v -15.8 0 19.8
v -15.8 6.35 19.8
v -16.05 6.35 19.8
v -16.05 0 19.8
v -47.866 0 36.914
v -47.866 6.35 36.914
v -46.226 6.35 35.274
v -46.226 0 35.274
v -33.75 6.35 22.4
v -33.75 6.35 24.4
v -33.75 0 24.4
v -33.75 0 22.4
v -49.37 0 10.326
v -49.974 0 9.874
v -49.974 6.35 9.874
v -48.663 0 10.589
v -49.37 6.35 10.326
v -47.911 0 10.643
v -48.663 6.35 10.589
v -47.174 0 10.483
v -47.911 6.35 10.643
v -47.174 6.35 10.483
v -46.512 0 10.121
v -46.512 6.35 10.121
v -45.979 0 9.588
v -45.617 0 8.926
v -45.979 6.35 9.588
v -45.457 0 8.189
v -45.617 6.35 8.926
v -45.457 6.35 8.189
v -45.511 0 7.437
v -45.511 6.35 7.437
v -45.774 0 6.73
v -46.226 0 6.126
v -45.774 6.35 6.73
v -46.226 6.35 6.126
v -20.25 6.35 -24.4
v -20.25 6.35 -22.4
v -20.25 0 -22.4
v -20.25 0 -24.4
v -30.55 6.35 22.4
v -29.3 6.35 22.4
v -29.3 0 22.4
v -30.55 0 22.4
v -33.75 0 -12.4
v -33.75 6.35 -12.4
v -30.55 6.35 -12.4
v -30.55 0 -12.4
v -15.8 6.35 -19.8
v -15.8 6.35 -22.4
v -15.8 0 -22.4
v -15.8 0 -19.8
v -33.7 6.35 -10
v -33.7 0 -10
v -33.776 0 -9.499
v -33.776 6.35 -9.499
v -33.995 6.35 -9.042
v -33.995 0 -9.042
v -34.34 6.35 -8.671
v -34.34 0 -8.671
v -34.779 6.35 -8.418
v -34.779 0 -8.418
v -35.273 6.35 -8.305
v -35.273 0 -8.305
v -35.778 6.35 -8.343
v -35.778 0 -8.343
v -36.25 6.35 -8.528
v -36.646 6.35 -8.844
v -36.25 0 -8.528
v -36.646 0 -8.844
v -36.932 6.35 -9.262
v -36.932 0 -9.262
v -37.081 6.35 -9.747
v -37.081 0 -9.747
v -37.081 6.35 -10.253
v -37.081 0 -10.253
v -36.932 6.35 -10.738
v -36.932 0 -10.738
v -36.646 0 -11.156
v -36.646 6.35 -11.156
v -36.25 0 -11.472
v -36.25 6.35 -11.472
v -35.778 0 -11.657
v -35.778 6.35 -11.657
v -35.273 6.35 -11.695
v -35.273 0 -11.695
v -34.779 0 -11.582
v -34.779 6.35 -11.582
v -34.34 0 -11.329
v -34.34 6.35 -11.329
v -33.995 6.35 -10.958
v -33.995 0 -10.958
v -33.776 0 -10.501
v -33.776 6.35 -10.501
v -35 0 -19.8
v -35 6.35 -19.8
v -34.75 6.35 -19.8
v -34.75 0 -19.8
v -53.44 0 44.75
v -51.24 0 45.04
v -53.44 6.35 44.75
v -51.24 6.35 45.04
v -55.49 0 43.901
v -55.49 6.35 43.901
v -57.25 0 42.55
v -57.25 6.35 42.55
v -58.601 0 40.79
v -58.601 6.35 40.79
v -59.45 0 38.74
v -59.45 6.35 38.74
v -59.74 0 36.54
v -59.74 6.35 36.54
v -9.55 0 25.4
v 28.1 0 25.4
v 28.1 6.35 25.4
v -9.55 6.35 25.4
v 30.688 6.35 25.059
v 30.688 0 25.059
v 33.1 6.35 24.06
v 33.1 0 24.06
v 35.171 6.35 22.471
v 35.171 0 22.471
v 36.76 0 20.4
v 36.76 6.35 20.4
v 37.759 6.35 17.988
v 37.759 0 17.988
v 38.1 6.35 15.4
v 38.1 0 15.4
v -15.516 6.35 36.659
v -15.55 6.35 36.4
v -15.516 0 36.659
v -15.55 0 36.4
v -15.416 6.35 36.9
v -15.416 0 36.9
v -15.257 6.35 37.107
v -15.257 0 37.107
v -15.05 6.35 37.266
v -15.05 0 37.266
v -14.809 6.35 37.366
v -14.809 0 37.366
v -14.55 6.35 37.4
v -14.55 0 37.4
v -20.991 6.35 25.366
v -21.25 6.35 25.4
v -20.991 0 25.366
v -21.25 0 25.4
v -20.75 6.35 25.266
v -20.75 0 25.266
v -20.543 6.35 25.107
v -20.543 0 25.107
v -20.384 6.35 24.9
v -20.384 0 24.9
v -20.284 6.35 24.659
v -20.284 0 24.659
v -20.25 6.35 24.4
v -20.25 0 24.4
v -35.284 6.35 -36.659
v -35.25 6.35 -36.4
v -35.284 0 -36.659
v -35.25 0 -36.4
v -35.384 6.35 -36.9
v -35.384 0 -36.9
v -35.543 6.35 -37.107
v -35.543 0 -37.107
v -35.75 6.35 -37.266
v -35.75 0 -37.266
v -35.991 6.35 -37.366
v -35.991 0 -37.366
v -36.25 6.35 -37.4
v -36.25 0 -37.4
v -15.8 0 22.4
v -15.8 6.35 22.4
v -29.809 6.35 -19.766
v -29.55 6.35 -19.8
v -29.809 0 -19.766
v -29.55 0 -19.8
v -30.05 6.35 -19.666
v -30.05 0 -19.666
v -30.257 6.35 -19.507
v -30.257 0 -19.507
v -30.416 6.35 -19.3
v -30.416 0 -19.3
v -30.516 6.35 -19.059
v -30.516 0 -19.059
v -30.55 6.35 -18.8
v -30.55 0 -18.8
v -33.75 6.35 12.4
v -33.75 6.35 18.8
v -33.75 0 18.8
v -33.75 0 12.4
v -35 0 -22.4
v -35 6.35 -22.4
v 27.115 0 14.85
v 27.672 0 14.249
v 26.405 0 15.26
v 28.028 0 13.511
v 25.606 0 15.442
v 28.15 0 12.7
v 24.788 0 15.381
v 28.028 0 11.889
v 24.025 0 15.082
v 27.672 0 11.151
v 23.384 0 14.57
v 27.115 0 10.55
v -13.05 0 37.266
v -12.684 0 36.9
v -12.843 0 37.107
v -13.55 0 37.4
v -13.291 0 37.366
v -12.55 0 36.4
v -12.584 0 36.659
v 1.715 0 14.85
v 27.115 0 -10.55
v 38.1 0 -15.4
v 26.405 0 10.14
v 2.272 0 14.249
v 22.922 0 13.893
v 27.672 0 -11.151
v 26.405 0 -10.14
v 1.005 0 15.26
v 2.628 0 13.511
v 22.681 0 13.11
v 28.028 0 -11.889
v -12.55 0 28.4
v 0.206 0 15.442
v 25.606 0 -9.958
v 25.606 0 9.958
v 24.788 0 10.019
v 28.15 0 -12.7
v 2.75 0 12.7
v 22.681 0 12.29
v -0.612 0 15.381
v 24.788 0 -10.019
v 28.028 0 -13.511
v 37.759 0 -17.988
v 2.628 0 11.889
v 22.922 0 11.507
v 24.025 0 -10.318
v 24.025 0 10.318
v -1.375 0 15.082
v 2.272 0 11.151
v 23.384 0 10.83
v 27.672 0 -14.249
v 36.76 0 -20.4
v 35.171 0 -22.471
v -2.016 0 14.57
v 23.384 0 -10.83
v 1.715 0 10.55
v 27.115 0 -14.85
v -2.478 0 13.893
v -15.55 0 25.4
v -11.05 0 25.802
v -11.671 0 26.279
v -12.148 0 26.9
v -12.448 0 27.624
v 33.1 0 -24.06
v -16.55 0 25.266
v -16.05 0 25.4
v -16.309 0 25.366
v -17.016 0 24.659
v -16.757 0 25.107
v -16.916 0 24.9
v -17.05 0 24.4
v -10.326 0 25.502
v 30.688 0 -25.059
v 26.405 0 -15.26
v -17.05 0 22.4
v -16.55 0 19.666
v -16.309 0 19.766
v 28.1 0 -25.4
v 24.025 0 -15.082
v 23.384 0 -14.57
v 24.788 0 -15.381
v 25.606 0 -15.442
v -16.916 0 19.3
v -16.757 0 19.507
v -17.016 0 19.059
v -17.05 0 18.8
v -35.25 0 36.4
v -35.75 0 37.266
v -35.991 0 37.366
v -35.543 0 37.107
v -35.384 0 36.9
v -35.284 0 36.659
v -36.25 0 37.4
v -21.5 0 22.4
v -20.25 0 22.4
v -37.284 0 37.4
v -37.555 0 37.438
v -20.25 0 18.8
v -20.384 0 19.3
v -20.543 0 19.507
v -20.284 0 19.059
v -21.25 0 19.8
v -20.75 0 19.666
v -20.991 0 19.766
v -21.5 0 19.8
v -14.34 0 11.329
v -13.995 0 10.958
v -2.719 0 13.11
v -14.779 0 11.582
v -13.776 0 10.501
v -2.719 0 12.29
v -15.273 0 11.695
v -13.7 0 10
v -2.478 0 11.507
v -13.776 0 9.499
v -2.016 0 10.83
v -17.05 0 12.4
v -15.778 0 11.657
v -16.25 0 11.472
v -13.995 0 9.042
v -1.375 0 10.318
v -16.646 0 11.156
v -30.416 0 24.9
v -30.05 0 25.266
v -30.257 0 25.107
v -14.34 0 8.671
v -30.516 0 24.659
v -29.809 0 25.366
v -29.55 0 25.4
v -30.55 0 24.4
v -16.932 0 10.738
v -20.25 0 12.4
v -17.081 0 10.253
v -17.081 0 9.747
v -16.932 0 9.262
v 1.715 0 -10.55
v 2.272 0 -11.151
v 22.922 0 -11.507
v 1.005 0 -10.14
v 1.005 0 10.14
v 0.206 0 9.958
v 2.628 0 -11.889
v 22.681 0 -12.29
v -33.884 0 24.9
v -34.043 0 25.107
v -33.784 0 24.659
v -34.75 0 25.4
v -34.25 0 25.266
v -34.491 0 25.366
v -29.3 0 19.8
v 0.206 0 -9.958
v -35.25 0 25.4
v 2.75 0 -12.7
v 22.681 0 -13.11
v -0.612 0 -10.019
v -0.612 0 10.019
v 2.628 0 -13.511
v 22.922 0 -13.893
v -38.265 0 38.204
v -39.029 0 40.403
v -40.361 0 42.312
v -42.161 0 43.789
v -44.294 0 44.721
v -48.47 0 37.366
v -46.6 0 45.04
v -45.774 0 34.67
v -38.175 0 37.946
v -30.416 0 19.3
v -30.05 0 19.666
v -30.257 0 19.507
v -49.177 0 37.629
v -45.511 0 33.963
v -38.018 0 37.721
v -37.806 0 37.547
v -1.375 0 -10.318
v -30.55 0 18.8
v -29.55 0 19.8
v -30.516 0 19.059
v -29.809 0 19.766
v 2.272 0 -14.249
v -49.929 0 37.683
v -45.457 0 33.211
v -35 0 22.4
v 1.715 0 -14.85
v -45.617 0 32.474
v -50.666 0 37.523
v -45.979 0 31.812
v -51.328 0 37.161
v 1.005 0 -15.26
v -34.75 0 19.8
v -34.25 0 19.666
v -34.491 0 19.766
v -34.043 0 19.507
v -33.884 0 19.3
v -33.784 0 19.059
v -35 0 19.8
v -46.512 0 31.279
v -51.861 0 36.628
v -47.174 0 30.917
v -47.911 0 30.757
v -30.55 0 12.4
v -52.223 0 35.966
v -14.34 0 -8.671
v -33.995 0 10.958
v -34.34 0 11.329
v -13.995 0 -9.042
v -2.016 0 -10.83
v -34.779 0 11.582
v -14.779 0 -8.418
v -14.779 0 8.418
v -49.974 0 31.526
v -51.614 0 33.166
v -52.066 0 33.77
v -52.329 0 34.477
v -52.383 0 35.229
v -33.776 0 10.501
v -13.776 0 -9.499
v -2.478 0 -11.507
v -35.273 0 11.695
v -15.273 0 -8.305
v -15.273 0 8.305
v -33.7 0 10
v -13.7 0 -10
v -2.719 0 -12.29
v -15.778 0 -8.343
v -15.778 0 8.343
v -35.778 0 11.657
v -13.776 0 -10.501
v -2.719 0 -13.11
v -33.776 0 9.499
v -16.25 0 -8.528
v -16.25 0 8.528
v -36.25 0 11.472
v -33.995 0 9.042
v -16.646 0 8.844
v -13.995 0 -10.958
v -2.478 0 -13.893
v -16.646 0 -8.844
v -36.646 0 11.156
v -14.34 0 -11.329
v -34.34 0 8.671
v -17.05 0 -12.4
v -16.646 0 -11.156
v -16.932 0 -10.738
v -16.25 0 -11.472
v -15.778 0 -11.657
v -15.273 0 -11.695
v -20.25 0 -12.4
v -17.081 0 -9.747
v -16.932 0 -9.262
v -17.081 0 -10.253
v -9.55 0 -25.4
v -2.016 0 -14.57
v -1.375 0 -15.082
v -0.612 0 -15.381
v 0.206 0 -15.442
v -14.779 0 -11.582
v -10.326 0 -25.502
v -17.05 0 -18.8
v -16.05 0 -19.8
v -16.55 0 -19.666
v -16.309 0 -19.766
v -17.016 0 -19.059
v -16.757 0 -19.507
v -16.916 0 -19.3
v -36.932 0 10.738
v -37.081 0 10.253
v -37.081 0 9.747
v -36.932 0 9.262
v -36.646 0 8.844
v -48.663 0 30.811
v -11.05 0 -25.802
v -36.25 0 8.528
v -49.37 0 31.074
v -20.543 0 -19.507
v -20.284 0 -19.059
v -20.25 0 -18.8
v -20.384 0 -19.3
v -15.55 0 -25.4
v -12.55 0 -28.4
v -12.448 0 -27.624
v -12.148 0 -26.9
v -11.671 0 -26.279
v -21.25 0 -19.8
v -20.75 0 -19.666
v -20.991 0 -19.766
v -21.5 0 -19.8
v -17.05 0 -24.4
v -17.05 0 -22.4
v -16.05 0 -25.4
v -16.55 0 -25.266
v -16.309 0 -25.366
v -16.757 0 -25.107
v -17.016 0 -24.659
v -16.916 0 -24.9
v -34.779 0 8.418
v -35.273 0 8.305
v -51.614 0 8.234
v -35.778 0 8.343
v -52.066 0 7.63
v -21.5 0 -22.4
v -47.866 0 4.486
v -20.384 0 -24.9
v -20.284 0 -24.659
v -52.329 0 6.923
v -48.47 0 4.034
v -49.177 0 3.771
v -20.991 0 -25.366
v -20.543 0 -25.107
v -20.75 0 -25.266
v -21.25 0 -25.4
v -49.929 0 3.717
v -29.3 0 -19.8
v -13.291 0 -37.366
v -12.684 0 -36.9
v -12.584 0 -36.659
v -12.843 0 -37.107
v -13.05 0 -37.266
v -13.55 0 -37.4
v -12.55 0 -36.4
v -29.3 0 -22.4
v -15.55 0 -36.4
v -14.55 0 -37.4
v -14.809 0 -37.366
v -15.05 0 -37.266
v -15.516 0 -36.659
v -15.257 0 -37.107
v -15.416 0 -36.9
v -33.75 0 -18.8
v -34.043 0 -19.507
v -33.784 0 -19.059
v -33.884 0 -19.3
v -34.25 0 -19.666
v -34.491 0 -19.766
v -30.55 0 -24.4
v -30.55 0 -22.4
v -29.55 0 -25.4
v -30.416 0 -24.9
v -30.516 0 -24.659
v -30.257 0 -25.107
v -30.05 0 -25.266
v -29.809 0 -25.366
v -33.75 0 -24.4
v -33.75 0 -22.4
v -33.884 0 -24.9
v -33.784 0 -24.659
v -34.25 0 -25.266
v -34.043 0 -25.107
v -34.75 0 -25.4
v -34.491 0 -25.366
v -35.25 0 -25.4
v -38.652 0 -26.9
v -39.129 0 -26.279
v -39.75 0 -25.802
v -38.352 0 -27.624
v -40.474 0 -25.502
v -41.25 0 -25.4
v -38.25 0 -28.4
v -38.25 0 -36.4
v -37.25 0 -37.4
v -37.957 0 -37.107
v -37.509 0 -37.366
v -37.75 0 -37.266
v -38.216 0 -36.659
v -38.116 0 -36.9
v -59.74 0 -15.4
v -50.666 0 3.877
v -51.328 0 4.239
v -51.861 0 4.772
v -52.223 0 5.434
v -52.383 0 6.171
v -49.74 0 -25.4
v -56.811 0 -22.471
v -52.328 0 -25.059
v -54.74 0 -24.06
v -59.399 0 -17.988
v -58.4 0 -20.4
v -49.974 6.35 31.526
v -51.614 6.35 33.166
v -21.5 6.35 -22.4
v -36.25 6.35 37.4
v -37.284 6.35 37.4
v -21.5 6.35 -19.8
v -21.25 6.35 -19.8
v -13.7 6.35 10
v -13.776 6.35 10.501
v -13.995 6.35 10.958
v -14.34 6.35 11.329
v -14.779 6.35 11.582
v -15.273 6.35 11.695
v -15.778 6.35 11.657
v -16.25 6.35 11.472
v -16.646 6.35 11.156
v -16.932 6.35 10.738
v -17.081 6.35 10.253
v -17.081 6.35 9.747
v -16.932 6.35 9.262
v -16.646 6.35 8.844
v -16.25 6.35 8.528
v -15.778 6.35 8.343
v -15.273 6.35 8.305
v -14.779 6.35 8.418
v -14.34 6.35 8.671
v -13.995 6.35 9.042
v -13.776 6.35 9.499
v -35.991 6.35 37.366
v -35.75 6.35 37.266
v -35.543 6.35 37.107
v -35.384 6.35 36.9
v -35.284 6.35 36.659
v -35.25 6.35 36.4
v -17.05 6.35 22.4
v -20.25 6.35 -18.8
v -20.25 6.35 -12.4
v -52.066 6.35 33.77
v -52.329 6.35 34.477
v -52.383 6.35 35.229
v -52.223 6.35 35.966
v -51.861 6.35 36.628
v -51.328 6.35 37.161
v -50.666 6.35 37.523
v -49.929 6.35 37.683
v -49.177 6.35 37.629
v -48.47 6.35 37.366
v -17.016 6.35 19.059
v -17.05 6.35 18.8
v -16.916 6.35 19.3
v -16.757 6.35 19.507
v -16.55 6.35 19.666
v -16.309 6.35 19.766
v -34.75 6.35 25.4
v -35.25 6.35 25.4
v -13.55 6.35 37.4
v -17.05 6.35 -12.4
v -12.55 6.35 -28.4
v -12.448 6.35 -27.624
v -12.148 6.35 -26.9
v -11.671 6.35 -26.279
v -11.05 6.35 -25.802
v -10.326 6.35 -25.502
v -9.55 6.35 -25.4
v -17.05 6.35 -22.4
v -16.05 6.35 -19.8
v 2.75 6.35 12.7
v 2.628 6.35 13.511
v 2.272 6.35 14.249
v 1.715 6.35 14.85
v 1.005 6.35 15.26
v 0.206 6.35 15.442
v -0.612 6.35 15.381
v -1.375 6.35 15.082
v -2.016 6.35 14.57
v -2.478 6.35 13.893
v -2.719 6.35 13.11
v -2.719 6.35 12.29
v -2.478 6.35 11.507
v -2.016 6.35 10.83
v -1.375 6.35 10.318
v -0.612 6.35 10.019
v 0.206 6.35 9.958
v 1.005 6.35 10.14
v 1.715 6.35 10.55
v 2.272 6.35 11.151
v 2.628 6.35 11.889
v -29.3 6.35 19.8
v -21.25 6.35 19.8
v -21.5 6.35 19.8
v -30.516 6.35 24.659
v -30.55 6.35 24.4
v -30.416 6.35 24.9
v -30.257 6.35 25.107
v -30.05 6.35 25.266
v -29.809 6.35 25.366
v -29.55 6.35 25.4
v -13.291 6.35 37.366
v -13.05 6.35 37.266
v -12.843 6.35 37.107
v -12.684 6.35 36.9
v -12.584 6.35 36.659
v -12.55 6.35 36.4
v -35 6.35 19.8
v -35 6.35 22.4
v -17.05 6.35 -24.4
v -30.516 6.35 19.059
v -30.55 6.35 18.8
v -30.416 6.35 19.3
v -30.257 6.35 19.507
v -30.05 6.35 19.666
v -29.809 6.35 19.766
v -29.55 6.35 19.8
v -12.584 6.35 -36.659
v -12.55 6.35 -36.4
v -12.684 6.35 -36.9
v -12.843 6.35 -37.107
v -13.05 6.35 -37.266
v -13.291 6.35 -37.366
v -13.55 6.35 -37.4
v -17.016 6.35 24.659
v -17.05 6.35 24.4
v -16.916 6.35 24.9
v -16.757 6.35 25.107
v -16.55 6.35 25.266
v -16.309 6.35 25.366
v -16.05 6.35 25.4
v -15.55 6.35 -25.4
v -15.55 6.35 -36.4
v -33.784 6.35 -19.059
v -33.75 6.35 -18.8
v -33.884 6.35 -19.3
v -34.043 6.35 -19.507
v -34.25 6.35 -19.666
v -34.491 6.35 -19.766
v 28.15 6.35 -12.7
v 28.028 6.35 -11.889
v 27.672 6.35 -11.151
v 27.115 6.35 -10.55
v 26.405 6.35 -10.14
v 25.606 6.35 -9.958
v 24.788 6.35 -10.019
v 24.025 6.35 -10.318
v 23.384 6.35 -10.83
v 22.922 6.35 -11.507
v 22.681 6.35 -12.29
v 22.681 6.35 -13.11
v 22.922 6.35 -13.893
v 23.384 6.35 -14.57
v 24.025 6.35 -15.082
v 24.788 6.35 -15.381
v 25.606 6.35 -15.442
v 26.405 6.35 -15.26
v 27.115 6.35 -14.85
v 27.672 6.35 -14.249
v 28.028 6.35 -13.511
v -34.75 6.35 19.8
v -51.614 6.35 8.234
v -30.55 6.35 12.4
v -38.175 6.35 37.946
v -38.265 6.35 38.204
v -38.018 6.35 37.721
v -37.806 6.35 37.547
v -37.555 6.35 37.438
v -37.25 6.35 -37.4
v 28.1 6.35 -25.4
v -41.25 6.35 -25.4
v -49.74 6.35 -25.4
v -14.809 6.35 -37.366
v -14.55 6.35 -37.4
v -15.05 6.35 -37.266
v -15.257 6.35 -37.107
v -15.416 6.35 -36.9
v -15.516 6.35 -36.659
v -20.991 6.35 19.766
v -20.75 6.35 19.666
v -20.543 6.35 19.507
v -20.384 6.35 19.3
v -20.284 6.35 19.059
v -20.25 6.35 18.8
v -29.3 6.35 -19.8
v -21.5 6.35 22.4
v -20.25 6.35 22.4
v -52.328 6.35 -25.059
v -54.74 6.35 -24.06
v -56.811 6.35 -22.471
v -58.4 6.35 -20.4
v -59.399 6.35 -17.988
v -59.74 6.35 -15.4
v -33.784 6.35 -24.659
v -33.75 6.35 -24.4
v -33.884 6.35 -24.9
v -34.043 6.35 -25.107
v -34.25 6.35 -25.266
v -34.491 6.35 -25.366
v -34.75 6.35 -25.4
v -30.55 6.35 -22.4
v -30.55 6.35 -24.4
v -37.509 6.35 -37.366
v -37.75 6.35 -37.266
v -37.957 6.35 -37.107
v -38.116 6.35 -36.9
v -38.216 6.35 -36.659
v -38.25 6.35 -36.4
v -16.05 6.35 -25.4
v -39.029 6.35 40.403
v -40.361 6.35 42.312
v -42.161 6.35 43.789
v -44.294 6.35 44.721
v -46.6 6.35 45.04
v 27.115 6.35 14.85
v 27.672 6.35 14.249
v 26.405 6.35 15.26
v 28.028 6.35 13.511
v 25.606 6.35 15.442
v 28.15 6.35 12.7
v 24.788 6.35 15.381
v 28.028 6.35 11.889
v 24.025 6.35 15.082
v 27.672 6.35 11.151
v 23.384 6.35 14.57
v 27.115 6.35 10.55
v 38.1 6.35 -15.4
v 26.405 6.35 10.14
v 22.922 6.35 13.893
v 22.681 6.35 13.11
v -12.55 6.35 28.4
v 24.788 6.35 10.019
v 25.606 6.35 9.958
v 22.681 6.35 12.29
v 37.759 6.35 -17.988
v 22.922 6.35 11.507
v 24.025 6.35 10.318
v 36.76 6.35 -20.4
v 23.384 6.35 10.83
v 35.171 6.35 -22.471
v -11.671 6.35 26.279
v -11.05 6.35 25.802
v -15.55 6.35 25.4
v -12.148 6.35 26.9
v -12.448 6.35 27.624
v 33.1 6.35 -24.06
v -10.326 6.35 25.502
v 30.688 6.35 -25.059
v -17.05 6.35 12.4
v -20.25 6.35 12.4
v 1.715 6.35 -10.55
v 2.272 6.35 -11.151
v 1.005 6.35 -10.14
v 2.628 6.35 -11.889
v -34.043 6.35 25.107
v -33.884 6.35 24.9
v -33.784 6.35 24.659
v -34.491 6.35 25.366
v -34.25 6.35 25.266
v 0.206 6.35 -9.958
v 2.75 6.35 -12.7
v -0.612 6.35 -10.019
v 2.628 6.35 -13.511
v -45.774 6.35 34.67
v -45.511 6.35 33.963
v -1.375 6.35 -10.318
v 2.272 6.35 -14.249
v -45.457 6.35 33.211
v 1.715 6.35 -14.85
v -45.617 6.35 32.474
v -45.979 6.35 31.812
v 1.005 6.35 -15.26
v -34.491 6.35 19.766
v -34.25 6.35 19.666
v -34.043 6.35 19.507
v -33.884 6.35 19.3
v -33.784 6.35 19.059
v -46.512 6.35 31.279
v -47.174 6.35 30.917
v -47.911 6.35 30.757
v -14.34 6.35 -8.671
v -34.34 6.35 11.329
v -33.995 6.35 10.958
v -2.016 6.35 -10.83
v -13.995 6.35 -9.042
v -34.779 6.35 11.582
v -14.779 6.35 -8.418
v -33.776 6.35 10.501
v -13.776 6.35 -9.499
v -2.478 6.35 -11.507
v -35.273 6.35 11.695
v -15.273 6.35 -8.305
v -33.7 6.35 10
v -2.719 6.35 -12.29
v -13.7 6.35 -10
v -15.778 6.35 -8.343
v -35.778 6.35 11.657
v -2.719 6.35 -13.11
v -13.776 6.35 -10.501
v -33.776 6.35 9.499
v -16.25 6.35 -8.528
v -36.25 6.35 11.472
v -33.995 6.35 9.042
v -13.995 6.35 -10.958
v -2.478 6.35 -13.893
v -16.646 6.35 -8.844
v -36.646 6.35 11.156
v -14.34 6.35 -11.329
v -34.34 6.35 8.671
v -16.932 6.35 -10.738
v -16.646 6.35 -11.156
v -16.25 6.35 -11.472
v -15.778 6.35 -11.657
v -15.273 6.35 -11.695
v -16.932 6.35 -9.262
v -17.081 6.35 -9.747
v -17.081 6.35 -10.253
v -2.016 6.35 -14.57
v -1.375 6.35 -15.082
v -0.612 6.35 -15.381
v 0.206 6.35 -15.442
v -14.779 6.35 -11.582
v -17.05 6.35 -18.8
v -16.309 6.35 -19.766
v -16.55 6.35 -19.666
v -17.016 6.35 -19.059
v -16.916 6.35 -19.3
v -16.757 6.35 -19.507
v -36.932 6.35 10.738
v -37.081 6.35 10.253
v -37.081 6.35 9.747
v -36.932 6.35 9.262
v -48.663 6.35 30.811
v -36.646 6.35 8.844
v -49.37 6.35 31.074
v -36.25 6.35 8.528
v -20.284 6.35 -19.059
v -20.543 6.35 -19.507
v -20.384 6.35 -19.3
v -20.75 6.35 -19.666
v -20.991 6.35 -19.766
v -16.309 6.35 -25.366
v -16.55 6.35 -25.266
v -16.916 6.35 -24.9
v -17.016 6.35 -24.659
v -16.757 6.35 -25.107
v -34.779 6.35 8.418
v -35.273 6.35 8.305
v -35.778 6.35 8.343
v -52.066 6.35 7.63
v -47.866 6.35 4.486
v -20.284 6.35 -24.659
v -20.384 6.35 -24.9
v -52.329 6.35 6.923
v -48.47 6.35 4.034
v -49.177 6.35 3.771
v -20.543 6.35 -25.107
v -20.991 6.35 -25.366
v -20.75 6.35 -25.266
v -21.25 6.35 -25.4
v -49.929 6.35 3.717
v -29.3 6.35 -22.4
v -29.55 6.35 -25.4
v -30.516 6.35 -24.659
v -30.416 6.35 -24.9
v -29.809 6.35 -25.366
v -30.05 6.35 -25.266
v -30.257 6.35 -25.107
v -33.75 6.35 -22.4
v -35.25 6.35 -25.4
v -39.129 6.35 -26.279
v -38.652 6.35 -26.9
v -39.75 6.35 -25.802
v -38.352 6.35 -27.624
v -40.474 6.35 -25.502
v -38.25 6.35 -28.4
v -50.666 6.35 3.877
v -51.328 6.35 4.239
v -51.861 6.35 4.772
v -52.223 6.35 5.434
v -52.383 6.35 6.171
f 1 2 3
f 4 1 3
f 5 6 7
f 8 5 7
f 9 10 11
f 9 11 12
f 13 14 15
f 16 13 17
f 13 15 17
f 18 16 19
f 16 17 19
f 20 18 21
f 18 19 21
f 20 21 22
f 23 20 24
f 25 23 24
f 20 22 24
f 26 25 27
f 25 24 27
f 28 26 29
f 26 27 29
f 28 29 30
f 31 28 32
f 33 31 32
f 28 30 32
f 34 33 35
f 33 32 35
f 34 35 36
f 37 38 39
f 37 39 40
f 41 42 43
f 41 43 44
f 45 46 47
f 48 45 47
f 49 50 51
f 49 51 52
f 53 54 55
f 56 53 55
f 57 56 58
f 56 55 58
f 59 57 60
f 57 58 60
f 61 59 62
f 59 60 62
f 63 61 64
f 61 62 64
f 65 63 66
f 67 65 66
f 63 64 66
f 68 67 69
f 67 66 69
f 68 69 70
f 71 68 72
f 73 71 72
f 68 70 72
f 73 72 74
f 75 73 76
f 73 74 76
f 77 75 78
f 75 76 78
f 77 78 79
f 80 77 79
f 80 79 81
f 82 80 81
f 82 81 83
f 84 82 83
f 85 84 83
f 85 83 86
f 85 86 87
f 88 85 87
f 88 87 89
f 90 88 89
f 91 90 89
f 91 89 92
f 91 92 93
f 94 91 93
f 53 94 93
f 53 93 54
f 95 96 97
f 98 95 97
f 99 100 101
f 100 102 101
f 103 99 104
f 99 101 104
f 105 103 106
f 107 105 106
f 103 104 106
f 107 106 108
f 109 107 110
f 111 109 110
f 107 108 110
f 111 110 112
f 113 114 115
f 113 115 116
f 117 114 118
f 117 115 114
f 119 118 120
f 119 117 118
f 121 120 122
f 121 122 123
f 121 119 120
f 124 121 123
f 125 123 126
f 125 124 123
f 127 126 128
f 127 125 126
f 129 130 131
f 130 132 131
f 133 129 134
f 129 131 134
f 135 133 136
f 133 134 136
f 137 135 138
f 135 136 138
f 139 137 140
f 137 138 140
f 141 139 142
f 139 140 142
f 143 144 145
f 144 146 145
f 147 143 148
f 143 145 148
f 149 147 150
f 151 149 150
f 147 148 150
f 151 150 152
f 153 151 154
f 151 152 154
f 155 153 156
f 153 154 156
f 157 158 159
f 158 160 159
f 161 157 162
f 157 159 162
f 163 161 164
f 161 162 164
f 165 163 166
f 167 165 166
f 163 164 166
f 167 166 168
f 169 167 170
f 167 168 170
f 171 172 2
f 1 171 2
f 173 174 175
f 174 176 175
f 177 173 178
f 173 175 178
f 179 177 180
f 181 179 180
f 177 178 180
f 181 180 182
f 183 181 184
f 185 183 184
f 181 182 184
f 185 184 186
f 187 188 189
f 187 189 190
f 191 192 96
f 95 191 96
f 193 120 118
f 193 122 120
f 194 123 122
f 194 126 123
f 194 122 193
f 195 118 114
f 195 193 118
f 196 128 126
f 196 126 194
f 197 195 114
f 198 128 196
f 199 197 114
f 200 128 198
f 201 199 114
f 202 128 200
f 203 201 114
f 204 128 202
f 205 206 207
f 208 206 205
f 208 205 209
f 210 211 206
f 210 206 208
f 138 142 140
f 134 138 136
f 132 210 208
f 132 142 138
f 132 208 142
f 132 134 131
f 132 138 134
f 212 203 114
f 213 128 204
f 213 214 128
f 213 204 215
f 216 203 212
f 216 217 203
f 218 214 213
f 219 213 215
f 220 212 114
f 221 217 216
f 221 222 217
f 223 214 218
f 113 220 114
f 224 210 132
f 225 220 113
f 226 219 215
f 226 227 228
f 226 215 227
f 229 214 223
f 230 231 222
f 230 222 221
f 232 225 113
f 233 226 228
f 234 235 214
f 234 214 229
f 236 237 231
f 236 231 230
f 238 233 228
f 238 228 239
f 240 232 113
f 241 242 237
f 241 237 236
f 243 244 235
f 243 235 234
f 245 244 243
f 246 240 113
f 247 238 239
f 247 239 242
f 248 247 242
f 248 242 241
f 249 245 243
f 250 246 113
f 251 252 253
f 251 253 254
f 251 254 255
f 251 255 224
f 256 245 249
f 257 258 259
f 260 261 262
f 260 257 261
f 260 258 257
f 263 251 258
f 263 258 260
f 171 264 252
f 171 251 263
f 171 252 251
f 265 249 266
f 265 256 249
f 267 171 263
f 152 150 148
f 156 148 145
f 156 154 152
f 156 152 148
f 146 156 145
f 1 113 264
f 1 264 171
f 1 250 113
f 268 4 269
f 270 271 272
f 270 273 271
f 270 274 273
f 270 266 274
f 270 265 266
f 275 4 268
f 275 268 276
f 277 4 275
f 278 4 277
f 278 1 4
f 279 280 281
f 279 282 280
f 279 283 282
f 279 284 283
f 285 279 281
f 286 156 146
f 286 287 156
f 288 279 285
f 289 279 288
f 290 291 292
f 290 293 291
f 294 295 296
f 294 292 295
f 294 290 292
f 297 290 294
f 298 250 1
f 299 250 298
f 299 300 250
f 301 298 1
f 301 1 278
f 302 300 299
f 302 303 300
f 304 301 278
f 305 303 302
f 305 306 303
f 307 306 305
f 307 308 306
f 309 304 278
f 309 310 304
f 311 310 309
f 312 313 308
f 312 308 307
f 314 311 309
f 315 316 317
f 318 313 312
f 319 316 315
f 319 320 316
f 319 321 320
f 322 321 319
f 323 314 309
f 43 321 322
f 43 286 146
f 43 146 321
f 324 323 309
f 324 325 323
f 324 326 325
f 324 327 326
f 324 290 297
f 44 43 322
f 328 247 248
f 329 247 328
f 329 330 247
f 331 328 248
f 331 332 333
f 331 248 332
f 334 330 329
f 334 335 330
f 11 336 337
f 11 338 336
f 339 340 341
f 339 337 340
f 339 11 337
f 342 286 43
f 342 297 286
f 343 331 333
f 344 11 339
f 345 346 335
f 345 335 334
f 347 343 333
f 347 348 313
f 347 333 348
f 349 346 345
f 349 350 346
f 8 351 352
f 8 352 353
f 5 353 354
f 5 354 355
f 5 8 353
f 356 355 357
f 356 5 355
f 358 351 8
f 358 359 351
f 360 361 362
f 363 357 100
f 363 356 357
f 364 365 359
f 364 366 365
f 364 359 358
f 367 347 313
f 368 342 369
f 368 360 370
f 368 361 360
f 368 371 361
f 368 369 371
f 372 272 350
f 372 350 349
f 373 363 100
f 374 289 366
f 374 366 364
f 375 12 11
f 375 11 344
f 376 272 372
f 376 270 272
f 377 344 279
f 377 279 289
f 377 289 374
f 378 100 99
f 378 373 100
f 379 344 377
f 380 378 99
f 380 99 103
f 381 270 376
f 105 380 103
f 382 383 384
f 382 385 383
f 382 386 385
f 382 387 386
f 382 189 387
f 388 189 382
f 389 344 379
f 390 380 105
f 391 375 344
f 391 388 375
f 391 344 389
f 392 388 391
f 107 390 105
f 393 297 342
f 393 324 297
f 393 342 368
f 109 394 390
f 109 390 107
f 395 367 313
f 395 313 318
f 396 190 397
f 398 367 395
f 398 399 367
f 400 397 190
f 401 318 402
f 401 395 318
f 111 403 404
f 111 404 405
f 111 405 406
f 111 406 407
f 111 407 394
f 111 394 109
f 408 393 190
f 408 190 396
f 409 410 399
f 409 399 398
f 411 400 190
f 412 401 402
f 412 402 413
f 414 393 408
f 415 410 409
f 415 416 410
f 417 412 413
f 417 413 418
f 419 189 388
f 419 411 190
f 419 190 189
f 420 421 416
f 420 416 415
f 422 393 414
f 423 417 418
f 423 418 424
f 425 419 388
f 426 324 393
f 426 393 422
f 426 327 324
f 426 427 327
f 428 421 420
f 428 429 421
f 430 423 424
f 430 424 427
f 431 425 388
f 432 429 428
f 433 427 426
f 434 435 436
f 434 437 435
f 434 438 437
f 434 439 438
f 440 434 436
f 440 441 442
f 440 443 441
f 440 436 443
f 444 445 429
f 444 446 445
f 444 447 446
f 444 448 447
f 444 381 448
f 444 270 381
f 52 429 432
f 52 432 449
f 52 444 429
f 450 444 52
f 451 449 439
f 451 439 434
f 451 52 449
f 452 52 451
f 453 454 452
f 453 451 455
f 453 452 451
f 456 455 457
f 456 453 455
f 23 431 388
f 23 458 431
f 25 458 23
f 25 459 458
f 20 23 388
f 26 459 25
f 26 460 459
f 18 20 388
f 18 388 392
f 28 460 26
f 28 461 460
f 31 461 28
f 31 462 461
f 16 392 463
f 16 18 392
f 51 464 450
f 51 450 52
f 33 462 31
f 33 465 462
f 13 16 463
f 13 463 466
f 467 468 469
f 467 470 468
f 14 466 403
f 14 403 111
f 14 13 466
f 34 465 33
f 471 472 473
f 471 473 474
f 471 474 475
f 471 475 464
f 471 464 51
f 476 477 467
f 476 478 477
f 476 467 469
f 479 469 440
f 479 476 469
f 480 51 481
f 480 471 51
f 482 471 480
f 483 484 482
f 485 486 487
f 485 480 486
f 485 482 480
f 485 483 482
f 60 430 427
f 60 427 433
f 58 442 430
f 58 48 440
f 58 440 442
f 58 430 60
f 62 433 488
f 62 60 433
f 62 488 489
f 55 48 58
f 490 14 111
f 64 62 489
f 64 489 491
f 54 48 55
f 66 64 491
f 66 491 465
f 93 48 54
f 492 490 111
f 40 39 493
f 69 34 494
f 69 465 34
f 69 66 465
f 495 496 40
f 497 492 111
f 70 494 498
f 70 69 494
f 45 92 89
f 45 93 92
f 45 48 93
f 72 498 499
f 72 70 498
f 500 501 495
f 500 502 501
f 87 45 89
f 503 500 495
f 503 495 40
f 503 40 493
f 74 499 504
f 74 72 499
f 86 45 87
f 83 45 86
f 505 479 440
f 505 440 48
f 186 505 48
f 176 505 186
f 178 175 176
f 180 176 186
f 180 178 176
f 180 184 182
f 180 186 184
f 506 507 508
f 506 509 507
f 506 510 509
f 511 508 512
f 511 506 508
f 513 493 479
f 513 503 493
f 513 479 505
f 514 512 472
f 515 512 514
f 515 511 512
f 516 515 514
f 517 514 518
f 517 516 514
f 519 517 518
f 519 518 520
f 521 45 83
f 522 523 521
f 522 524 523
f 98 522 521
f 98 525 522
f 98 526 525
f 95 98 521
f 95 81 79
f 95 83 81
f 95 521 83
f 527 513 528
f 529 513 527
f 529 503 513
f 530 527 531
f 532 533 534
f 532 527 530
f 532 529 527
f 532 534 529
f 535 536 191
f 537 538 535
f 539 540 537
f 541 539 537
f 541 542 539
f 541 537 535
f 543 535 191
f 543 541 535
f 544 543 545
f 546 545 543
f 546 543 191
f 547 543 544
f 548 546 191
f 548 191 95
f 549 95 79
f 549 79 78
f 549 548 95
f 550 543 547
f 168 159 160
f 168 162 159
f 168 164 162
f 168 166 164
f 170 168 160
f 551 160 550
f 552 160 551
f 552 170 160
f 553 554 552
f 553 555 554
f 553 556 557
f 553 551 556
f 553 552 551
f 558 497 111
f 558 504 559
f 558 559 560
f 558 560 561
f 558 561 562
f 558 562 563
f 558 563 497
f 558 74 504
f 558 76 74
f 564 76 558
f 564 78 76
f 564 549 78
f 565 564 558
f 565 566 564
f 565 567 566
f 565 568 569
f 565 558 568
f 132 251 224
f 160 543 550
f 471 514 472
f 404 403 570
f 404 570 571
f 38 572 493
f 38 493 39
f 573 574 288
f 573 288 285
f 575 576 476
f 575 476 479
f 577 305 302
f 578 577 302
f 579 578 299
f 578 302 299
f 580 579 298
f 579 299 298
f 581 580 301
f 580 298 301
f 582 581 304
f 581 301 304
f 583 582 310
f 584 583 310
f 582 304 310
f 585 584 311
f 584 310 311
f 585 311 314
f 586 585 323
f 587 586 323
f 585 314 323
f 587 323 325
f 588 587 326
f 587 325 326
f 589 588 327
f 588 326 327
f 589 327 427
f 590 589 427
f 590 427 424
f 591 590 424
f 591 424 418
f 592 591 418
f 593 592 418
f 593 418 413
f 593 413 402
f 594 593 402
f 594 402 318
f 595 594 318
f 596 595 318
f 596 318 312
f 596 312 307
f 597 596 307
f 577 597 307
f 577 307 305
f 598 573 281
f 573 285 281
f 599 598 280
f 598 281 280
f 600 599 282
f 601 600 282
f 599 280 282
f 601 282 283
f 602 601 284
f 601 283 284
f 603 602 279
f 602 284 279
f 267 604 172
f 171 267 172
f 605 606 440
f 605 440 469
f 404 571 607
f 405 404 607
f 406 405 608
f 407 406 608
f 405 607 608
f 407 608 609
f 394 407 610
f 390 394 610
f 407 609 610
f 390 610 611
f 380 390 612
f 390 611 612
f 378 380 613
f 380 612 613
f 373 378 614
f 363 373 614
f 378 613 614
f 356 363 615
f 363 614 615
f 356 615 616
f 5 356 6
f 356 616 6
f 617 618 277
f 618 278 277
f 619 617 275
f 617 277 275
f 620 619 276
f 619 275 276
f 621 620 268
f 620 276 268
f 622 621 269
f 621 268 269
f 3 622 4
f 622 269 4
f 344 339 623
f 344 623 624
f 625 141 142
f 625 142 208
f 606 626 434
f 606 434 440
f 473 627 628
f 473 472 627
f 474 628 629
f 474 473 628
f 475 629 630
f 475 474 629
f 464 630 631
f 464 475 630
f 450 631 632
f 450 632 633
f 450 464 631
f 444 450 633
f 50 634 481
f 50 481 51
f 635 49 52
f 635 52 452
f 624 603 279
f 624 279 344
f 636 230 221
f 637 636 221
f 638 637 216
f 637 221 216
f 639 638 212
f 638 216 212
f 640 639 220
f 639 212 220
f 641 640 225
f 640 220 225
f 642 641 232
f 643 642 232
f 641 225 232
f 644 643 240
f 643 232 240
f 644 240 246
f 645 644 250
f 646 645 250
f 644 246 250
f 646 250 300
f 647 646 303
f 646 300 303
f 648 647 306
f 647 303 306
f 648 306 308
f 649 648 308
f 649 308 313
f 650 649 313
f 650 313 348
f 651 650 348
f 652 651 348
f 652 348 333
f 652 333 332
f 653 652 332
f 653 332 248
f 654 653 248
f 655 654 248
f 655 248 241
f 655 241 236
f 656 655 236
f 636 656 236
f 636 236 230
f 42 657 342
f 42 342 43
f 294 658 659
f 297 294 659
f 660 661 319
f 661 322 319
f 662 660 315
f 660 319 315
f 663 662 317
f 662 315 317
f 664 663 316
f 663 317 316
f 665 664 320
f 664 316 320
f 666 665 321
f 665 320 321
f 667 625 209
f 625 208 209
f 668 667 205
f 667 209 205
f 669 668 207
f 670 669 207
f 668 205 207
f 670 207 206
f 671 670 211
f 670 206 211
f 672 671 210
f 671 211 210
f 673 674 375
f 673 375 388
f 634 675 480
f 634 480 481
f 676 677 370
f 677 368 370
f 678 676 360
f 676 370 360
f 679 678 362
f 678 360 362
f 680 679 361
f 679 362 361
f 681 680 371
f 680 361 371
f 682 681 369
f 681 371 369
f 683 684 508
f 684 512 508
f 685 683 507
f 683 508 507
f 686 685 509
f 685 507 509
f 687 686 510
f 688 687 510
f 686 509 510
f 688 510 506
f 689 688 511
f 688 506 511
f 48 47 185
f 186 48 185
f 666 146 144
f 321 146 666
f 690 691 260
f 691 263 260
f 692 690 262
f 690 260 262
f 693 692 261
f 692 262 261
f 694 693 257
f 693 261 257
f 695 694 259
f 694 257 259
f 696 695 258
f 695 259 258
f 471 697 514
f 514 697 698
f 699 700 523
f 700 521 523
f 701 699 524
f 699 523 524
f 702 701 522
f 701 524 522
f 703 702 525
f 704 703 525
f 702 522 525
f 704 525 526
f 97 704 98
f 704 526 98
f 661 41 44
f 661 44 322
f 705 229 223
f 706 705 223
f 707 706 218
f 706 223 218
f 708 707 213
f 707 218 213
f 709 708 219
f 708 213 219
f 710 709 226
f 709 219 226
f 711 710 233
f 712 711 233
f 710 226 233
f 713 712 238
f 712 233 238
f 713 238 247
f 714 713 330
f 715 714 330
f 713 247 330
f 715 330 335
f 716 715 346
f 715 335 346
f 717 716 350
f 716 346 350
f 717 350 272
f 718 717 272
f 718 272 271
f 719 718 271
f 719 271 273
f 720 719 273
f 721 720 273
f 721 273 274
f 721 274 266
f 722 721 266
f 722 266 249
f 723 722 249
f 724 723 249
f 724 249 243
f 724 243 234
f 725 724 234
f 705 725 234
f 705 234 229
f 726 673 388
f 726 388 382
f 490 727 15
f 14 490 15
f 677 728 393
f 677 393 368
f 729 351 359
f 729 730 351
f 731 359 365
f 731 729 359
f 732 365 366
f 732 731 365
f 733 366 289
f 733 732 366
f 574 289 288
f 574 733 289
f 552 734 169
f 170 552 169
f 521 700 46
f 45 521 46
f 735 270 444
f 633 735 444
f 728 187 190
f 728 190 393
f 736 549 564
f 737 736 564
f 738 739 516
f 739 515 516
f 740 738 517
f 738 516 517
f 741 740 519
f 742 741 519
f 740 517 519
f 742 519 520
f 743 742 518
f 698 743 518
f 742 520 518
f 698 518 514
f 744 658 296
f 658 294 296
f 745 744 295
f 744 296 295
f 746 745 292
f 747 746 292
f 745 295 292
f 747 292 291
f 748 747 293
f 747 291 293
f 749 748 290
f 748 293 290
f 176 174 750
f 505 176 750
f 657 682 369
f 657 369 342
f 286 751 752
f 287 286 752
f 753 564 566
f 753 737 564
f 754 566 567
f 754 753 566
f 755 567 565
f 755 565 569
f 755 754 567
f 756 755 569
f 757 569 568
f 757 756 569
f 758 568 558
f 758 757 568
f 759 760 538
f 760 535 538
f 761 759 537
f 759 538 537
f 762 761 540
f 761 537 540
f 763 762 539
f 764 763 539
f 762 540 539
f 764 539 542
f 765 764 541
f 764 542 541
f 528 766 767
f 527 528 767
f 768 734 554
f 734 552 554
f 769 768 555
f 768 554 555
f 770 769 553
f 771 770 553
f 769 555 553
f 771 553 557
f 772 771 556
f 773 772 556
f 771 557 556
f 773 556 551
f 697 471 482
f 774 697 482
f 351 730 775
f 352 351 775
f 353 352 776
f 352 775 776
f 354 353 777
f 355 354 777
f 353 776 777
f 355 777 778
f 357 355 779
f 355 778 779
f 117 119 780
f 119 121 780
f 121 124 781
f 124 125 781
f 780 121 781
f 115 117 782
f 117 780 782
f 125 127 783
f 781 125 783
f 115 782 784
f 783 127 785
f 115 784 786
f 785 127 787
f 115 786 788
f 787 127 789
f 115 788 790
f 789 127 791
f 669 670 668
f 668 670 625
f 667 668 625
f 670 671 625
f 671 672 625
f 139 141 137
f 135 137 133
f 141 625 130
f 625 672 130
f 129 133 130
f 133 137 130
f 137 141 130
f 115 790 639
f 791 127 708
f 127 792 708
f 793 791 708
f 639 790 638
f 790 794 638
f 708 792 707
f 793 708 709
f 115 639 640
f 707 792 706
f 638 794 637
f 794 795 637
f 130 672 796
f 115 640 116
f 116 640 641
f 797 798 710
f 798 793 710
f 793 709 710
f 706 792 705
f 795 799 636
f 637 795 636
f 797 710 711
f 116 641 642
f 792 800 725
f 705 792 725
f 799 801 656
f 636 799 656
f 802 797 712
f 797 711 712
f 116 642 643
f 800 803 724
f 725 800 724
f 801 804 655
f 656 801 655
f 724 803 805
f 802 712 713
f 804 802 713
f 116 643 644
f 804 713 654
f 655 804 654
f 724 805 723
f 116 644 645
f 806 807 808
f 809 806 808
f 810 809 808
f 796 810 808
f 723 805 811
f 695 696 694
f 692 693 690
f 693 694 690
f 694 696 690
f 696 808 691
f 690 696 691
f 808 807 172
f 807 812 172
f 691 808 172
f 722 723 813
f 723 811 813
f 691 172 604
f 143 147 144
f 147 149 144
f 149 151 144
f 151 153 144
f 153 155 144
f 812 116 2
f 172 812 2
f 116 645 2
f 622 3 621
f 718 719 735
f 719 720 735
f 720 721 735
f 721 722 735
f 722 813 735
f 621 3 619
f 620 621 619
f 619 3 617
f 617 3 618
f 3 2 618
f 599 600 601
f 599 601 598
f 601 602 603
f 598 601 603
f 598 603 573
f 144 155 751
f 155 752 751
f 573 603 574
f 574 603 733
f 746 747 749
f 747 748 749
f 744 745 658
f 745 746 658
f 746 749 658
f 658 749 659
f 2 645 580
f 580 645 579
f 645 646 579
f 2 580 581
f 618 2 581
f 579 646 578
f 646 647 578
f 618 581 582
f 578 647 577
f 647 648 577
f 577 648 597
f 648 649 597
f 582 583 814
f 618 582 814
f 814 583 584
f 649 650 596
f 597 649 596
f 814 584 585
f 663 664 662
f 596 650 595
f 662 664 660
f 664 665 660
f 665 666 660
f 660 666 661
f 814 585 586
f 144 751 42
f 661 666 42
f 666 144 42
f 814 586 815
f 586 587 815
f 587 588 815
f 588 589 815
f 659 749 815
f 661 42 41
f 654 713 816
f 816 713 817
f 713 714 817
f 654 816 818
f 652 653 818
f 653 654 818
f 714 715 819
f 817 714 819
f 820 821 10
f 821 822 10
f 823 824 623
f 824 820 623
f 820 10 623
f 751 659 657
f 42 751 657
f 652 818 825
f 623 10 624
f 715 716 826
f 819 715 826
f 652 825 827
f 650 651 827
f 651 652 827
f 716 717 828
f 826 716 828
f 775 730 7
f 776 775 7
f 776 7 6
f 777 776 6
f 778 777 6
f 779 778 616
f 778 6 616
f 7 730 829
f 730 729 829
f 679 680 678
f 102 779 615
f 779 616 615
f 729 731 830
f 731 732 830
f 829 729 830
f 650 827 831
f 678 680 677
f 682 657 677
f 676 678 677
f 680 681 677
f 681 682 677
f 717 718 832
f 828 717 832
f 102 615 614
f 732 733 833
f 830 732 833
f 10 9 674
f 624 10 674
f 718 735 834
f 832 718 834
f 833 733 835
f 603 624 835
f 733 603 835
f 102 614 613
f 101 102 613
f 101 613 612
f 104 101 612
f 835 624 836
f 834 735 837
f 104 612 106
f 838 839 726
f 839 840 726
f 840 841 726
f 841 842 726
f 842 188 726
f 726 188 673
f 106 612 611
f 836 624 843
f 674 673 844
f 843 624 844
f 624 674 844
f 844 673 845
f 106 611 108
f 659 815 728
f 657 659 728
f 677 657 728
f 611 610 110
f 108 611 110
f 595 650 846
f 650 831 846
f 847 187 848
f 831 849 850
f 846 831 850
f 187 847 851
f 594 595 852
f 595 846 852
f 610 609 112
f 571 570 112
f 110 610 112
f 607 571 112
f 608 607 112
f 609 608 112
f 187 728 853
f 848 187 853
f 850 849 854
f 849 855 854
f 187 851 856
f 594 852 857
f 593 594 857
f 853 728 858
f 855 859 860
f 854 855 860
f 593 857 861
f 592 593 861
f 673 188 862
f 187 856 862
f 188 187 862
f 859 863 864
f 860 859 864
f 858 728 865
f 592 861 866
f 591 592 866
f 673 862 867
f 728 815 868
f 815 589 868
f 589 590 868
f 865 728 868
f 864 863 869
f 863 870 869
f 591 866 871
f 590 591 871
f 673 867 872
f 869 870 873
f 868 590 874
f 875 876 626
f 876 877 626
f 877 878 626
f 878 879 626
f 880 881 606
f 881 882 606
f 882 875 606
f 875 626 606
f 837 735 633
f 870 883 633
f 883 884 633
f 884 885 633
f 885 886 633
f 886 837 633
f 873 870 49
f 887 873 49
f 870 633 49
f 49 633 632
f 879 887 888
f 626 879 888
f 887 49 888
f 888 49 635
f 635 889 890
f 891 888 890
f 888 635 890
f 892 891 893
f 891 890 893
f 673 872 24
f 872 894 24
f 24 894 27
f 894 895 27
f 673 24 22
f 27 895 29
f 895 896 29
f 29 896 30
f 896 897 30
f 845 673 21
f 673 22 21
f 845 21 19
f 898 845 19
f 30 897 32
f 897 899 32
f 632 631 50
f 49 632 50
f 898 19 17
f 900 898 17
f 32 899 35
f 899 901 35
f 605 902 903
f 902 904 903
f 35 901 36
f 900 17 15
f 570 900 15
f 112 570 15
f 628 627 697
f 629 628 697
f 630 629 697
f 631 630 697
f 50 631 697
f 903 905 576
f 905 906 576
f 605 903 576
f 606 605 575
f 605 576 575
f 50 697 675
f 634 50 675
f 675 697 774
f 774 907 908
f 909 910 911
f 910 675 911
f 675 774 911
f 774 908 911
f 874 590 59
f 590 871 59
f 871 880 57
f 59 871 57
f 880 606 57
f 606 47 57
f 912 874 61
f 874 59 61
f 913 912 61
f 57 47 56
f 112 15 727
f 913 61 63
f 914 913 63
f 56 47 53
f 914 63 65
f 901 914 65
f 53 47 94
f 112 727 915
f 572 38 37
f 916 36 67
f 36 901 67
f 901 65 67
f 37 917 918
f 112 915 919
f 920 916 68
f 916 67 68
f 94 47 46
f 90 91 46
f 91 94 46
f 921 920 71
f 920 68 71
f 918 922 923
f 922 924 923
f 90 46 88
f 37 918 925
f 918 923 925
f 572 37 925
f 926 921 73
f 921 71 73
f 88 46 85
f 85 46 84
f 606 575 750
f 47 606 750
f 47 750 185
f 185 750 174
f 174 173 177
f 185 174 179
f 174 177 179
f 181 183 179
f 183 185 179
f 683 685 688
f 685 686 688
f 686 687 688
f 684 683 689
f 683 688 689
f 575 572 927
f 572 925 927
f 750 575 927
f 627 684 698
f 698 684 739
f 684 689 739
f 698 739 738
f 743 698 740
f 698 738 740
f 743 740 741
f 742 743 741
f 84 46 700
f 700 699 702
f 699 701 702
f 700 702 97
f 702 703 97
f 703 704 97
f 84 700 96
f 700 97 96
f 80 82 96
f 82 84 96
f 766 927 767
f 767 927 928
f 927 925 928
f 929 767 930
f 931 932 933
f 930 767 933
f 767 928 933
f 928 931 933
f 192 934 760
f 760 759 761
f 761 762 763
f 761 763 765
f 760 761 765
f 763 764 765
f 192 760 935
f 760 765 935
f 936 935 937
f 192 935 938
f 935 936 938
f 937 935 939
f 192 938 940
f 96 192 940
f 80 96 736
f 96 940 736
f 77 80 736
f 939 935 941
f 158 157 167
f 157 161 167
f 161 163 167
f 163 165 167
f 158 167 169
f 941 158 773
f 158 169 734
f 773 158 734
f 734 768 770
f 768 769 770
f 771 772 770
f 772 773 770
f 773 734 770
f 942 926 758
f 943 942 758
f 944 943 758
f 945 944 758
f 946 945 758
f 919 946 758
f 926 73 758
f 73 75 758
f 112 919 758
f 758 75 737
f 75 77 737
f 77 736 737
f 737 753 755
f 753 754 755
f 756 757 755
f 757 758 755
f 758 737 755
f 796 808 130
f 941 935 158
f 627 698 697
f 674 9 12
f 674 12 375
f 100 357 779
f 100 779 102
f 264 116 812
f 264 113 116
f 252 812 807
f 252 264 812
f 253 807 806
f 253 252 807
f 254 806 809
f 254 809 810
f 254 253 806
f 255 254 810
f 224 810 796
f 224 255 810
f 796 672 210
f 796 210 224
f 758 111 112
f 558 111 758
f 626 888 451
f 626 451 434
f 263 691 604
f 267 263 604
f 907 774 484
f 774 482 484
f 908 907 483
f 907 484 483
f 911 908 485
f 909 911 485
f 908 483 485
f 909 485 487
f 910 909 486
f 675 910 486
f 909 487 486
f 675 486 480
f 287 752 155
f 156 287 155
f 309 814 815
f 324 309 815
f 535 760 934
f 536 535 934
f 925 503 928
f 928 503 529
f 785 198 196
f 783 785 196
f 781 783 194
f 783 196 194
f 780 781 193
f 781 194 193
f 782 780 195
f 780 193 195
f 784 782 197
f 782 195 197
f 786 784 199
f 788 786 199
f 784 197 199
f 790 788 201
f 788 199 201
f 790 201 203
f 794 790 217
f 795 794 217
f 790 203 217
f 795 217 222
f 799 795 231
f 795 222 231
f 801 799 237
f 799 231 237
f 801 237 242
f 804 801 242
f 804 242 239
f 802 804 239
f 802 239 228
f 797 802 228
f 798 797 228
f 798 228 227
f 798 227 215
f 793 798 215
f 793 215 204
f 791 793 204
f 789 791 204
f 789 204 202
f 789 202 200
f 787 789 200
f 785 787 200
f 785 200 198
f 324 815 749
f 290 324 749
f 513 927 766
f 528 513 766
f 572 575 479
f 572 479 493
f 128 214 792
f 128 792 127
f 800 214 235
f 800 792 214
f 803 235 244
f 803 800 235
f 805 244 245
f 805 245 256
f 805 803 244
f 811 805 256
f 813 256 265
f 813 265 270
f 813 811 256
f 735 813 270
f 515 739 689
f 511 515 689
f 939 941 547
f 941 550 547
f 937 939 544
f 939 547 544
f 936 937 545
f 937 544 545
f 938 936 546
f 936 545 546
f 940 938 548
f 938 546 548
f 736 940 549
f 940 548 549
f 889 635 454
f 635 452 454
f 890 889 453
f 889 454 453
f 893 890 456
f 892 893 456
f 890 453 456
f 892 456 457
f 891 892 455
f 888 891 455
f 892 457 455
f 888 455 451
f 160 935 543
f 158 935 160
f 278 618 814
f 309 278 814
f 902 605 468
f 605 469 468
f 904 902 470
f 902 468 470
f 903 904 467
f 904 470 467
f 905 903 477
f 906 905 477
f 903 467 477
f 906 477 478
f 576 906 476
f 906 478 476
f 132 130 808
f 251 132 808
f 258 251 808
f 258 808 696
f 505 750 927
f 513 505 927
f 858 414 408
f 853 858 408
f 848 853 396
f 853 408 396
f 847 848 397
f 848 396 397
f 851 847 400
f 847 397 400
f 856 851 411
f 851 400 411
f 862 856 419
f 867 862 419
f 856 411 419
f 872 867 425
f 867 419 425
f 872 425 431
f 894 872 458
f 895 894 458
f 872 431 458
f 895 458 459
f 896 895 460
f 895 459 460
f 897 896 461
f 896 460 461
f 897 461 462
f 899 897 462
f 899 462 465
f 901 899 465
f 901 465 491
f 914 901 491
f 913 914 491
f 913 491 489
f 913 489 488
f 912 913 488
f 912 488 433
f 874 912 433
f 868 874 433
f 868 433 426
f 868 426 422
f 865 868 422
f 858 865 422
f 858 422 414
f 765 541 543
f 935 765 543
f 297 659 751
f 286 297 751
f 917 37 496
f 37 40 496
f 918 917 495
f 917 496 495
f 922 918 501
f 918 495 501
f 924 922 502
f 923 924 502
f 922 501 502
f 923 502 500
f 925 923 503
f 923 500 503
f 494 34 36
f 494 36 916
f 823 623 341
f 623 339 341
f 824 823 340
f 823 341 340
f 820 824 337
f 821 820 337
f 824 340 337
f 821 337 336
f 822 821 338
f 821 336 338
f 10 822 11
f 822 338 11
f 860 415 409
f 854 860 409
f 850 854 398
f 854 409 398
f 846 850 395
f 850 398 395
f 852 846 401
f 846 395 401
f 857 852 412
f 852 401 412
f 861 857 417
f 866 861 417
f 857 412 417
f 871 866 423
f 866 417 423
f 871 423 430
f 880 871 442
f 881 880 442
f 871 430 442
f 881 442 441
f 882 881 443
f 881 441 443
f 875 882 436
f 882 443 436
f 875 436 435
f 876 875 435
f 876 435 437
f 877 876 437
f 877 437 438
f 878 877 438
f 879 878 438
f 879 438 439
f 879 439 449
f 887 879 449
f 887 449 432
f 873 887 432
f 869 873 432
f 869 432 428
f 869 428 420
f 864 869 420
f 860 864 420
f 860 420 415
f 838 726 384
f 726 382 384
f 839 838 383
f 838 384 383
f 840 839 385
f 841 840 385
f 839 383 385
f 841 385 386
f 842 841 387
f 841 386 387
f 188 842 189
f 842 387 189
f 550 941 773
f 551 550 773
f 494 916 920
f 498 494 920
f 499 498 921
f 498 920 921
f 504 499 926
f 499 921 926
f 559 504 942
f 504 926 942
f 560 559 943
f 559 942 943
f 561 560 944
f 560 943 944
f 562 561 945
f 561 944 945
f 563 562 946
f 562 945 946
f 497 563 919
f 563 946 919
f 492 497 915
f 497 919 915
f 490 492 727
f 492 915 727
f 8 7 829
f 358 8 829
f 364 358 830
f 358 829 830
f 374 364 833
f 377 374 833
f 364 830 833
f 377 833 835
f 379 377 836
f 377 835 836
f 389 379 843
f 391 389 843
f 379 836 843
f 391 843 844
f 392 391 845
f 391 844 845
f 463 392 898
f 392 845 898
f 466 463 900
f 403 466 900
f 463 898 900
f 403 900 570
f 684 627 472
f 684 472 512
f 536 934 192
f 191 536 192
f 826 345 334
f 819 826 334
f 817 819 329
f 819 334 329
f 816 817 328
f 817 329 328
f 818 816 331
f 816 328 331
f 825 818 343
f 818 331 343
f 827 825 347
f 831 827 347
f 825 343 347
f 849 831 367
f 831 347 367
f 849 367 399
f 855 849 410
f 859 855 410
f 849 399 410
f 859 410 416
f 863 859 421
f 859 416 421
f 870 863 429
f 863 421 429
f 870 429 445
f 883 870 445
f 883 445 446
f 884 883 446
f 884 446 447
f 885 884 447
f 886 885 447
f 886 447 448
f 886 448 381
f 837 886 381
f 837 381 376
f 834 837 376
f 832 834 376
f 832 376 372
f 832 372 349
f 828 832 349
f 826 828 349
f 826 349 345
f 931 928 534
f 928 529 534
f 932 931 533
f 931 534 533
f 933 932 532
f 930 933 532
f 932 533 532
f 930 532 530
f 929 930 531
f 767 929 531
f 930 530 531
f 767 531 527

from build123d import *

# Parameters (mm, degrees)
BOSS_EXTRUDE1_DEPTH  = 6.35
FILLET1_R            = 8.5
FILLET2_R            = 10
M5_CLEARANCE_HOLE1_D = 5.5
M3_CLEARANCE_HOLE1_D = 3.4
CUT_EXTRUDE1_DEPTH   = 7.35
SKETCH9_W            = 3
SKETCH9_H            = 12
BOSS_EXTRUDE2_DEPTH  = 6.35
CUT_EXTRUDE2_DEPTH   = 7.35
FILLET3_R            = 1
FILLET4_R            = 3


with BuildPart() as part:
    # Sketch1 → Boss-Extrude1 (new body)
    with BuildSketch(Plane(origin=(0, 0, 0), x_dir=(1, 0, 0), z_dir=(0, 1, 0))):
        Polygon((38.1, -25.4), (-38.1, -25.4), (-38.1, -45.04), (-59.74, -45.04), (-59.74, 25.4), (-38.1, 25.4), (38.1, 25.4), align=None)
    extrude(amount=BOSS_EXTRUDE1_DEPTH)

    # Fillet1
    fillet1_edges = [part.edges().sort_by_distance(p)[0] for p in [
        (-38.1, 3.175, 45.04),
        (-59.74, 3.175, 45.04),
    ]]
    fillet(fillet1_edges, radius=FILLET1_R)

    # Fillet2
    fillet2_edges = [part.edges().sort_by_distance(p)[0] for p in [
        (38.1, 3.175, -25.4),
        (38.1, 3.175, 25.4),
        (-59.74, 3.175, -25.4),
    ]]
    fillet(fillet2_edges, radius=FILLET2_R)

    # M5 Clearance Hole1 (through all)
    with Locations(Plane(origin=(0, 6.35, 0), x_dir=(-1, 0, 0), z_dir=(0, 1, 0))):
        with Locations((0, 12.7), (-25.4, 12.7), (-25.4, -12.7), (0, -12.7)):
            Hole(M5_CLEARANCE_HOLE1_D / 2)

    # M3 Clearance Hole1 (through all)
    with Locations(Plane(origin=(0, 6.35, 0), x_dir=(-1, 0, 0), z_dir=(0, 1, 0))):
        with Locations((15.4, 10), (15.4, -10), (35.4, -10), (35.4, 10)):
            Hole(M3_CLEARANCE_HOLE1_D / 2)

    # Sketch8 → Cut-Extrude1 (cut, through all)
    with BuildSketch(Plane(origin=(0, 6.35, 0), x_dir=(1, 0, 0), z_dir=(0, 1, 0))):
        with BuildLine():
            Line((-51.61383297, -8.23383297), (-49.97383297, -9.87383297))
            ThreePointArc((-49.97383297, -9.87383297), (-46.22616703, -9.87383297), (-46.22616703, -6.12616703))
            Line((-46.22616703, -6.12616703), (-47.86616703, -4.48616703))
            ThreePointArc((-47.86616703, -4.48616703), (-51.61383297, -4.48616703), (-51.61383297, -8.23383297))
        make_face()
        with BuildLine():
            Line((-47.86616703, -36.91383297), (-46.22616703, -35.27383297))
            ThreePointArc((-46.22616703, -35.27383297), (-46.22616703, -31.52616703), (-49.97383297, -31.52616703))
            Line((-49.97383297, -31.52616703), (-51.61383297, -33.16616703))
            ThreePointArc((-51.61383297, -33.16616703), (-51.61383297, -36.91383297), (-47.86616703, -36.91383297))
        make_face()
    extrude(amount=-CUT_EXTRUDE1_DEPTH, mode=Mode.SUBTRACT)

    # Sketch9 → Boss-Extrude2 (add)
    with BuildSketch(Plane(origin=(0, 6.35, 0), x_dir=(1, 0, 0), z_dir=(0, 1, 0))):
        with Locations((-14.05, 31.4)):
            Rectangle(SKETCH9_W, SKETCH9_H)
        with Locations((-36.75, 31.4)):
            Rectangle(SKETCH9_W, SKETCH9_H)
        with Locations((-36.75, -31.4)):
            Rectangle(SKETCH9_W, SKETCH9_H)
        with Locations((-14.05, -31.4)):
            Rectangle(SKETCH9_W, SKETCH9_H)
    extrude(amount=-BOSS_EXTRUDE2_DEPTH)

    # Sketch10 → Cut-Extrude2 (cut, through all)
    with BuildSketch(Plane(origin=(0, 6.35, 0), x_dir=(1, 0, 0), z_dir=(0, 1, 0))):
        Polygon((-33.75, 12.4), (-30.55, 12.4), (-30.55, 19.8), (-29.3, 19.8), (-29.3, 22.4), (-30.55, 22.4), (-30.55, 25.4), (-33.75, 25.4), (-33.75, 22.4), (-35, 22.4), (-35, 19.8), (-33.75, 19.8), align=None)
        Polygon((-20.25, 12.4), (-20.25, 19.8), (-21.5, 19.8), (-21.5, 22.4), (-20.25, 22.4), (-20.25, 25.4), (-17.05, 25.4), (-17.05, 22.4), (-15.8, 22.4), (-15.8, 19.8), (-17.05, 19.8), (-17.05, 12.4), align=None)
        Polygon((-20.25, -22.4), (-20.25, -25.4), (-17.05, -25.4), (-17.05, -22.4), (-15.8, -22.4), (-15.8, -19.8), (-17.05, -19.8), (-17.05, -12.4), (-20.25, -12.4), (-20.25, -19.8), (-21.5, -19.8), (-21.5, -22.4), align=None)
        Polygon((-30.55, -22.4), (-30.55, -25.4), (-33.75, -25.4), (-33.75, -22.4), (-35, -22.4), (-35, -19.8), (-33.75, -19.8), (-33.75, -12.4), (-30.55, -12.4), (-30.55, -19.8), (-29.3, -19.8), (-29.3, -22.4), align=None)
    extrude(amount=-CUT_EXTRUDE2_DEPTH, mode=Mode.SUBTRACT)

    # Fillet3
    fillet3_edges = [part.edges().sort_by_distance(p)[0] for p in [
        (-15.55, 3.175, -37.4),
        (-12.55, 3.175, -37.4),
        (-38.25, 3.175, -37.4),
        (-35.25, 3.175, -37.4),
        (-38.143617795, 3.175, 37.4),
        (-35.25, 3.175, 37.4),
        (-12.55, 3.175, 37.4),
        (-15.55, 3.175, 37.4),
        (-30.55, 3.175, -19.8),
        (-33.75, 3.175, -19.8),
        (-33.75, 3.175, -25.4),
        (-30.55, 3.175, -25.4),
        (-20.25, 3.175, -19.8),
        (-20.25, 3.175, -25.4),
        (-17.05, 3.175, -25.4),
        (-17.05, 3.175, -19.8),
        (-20.25, 3.175, 19.8),
        (-17.05, 3.175, 19.8),
        (-17.05, 3.175, 25.4),
        (-20.25, 3.175, 25.4),
        (-30.55, 3.175, 25.4),
        (-33.75, 3.175, 25.4),
        (-33.75, 3.175, 19.8),
        (-30.55, 3.175, 19.8),
    ]]
    fillet(fillet3_edges, radius=FILLET3_R)

    # Fillet4
    fillet4_edges = [part.edges().sort_by_distance(p)[0] for p in [
        (-12.55, 3.175, -25.4),
        (-38.25, 3.175, -25.4),
        (-12.55, 3.175, 25.4),
    ]]
    fillet(fillet4_edges, radius=FILLET4_R)


solid = part.part
